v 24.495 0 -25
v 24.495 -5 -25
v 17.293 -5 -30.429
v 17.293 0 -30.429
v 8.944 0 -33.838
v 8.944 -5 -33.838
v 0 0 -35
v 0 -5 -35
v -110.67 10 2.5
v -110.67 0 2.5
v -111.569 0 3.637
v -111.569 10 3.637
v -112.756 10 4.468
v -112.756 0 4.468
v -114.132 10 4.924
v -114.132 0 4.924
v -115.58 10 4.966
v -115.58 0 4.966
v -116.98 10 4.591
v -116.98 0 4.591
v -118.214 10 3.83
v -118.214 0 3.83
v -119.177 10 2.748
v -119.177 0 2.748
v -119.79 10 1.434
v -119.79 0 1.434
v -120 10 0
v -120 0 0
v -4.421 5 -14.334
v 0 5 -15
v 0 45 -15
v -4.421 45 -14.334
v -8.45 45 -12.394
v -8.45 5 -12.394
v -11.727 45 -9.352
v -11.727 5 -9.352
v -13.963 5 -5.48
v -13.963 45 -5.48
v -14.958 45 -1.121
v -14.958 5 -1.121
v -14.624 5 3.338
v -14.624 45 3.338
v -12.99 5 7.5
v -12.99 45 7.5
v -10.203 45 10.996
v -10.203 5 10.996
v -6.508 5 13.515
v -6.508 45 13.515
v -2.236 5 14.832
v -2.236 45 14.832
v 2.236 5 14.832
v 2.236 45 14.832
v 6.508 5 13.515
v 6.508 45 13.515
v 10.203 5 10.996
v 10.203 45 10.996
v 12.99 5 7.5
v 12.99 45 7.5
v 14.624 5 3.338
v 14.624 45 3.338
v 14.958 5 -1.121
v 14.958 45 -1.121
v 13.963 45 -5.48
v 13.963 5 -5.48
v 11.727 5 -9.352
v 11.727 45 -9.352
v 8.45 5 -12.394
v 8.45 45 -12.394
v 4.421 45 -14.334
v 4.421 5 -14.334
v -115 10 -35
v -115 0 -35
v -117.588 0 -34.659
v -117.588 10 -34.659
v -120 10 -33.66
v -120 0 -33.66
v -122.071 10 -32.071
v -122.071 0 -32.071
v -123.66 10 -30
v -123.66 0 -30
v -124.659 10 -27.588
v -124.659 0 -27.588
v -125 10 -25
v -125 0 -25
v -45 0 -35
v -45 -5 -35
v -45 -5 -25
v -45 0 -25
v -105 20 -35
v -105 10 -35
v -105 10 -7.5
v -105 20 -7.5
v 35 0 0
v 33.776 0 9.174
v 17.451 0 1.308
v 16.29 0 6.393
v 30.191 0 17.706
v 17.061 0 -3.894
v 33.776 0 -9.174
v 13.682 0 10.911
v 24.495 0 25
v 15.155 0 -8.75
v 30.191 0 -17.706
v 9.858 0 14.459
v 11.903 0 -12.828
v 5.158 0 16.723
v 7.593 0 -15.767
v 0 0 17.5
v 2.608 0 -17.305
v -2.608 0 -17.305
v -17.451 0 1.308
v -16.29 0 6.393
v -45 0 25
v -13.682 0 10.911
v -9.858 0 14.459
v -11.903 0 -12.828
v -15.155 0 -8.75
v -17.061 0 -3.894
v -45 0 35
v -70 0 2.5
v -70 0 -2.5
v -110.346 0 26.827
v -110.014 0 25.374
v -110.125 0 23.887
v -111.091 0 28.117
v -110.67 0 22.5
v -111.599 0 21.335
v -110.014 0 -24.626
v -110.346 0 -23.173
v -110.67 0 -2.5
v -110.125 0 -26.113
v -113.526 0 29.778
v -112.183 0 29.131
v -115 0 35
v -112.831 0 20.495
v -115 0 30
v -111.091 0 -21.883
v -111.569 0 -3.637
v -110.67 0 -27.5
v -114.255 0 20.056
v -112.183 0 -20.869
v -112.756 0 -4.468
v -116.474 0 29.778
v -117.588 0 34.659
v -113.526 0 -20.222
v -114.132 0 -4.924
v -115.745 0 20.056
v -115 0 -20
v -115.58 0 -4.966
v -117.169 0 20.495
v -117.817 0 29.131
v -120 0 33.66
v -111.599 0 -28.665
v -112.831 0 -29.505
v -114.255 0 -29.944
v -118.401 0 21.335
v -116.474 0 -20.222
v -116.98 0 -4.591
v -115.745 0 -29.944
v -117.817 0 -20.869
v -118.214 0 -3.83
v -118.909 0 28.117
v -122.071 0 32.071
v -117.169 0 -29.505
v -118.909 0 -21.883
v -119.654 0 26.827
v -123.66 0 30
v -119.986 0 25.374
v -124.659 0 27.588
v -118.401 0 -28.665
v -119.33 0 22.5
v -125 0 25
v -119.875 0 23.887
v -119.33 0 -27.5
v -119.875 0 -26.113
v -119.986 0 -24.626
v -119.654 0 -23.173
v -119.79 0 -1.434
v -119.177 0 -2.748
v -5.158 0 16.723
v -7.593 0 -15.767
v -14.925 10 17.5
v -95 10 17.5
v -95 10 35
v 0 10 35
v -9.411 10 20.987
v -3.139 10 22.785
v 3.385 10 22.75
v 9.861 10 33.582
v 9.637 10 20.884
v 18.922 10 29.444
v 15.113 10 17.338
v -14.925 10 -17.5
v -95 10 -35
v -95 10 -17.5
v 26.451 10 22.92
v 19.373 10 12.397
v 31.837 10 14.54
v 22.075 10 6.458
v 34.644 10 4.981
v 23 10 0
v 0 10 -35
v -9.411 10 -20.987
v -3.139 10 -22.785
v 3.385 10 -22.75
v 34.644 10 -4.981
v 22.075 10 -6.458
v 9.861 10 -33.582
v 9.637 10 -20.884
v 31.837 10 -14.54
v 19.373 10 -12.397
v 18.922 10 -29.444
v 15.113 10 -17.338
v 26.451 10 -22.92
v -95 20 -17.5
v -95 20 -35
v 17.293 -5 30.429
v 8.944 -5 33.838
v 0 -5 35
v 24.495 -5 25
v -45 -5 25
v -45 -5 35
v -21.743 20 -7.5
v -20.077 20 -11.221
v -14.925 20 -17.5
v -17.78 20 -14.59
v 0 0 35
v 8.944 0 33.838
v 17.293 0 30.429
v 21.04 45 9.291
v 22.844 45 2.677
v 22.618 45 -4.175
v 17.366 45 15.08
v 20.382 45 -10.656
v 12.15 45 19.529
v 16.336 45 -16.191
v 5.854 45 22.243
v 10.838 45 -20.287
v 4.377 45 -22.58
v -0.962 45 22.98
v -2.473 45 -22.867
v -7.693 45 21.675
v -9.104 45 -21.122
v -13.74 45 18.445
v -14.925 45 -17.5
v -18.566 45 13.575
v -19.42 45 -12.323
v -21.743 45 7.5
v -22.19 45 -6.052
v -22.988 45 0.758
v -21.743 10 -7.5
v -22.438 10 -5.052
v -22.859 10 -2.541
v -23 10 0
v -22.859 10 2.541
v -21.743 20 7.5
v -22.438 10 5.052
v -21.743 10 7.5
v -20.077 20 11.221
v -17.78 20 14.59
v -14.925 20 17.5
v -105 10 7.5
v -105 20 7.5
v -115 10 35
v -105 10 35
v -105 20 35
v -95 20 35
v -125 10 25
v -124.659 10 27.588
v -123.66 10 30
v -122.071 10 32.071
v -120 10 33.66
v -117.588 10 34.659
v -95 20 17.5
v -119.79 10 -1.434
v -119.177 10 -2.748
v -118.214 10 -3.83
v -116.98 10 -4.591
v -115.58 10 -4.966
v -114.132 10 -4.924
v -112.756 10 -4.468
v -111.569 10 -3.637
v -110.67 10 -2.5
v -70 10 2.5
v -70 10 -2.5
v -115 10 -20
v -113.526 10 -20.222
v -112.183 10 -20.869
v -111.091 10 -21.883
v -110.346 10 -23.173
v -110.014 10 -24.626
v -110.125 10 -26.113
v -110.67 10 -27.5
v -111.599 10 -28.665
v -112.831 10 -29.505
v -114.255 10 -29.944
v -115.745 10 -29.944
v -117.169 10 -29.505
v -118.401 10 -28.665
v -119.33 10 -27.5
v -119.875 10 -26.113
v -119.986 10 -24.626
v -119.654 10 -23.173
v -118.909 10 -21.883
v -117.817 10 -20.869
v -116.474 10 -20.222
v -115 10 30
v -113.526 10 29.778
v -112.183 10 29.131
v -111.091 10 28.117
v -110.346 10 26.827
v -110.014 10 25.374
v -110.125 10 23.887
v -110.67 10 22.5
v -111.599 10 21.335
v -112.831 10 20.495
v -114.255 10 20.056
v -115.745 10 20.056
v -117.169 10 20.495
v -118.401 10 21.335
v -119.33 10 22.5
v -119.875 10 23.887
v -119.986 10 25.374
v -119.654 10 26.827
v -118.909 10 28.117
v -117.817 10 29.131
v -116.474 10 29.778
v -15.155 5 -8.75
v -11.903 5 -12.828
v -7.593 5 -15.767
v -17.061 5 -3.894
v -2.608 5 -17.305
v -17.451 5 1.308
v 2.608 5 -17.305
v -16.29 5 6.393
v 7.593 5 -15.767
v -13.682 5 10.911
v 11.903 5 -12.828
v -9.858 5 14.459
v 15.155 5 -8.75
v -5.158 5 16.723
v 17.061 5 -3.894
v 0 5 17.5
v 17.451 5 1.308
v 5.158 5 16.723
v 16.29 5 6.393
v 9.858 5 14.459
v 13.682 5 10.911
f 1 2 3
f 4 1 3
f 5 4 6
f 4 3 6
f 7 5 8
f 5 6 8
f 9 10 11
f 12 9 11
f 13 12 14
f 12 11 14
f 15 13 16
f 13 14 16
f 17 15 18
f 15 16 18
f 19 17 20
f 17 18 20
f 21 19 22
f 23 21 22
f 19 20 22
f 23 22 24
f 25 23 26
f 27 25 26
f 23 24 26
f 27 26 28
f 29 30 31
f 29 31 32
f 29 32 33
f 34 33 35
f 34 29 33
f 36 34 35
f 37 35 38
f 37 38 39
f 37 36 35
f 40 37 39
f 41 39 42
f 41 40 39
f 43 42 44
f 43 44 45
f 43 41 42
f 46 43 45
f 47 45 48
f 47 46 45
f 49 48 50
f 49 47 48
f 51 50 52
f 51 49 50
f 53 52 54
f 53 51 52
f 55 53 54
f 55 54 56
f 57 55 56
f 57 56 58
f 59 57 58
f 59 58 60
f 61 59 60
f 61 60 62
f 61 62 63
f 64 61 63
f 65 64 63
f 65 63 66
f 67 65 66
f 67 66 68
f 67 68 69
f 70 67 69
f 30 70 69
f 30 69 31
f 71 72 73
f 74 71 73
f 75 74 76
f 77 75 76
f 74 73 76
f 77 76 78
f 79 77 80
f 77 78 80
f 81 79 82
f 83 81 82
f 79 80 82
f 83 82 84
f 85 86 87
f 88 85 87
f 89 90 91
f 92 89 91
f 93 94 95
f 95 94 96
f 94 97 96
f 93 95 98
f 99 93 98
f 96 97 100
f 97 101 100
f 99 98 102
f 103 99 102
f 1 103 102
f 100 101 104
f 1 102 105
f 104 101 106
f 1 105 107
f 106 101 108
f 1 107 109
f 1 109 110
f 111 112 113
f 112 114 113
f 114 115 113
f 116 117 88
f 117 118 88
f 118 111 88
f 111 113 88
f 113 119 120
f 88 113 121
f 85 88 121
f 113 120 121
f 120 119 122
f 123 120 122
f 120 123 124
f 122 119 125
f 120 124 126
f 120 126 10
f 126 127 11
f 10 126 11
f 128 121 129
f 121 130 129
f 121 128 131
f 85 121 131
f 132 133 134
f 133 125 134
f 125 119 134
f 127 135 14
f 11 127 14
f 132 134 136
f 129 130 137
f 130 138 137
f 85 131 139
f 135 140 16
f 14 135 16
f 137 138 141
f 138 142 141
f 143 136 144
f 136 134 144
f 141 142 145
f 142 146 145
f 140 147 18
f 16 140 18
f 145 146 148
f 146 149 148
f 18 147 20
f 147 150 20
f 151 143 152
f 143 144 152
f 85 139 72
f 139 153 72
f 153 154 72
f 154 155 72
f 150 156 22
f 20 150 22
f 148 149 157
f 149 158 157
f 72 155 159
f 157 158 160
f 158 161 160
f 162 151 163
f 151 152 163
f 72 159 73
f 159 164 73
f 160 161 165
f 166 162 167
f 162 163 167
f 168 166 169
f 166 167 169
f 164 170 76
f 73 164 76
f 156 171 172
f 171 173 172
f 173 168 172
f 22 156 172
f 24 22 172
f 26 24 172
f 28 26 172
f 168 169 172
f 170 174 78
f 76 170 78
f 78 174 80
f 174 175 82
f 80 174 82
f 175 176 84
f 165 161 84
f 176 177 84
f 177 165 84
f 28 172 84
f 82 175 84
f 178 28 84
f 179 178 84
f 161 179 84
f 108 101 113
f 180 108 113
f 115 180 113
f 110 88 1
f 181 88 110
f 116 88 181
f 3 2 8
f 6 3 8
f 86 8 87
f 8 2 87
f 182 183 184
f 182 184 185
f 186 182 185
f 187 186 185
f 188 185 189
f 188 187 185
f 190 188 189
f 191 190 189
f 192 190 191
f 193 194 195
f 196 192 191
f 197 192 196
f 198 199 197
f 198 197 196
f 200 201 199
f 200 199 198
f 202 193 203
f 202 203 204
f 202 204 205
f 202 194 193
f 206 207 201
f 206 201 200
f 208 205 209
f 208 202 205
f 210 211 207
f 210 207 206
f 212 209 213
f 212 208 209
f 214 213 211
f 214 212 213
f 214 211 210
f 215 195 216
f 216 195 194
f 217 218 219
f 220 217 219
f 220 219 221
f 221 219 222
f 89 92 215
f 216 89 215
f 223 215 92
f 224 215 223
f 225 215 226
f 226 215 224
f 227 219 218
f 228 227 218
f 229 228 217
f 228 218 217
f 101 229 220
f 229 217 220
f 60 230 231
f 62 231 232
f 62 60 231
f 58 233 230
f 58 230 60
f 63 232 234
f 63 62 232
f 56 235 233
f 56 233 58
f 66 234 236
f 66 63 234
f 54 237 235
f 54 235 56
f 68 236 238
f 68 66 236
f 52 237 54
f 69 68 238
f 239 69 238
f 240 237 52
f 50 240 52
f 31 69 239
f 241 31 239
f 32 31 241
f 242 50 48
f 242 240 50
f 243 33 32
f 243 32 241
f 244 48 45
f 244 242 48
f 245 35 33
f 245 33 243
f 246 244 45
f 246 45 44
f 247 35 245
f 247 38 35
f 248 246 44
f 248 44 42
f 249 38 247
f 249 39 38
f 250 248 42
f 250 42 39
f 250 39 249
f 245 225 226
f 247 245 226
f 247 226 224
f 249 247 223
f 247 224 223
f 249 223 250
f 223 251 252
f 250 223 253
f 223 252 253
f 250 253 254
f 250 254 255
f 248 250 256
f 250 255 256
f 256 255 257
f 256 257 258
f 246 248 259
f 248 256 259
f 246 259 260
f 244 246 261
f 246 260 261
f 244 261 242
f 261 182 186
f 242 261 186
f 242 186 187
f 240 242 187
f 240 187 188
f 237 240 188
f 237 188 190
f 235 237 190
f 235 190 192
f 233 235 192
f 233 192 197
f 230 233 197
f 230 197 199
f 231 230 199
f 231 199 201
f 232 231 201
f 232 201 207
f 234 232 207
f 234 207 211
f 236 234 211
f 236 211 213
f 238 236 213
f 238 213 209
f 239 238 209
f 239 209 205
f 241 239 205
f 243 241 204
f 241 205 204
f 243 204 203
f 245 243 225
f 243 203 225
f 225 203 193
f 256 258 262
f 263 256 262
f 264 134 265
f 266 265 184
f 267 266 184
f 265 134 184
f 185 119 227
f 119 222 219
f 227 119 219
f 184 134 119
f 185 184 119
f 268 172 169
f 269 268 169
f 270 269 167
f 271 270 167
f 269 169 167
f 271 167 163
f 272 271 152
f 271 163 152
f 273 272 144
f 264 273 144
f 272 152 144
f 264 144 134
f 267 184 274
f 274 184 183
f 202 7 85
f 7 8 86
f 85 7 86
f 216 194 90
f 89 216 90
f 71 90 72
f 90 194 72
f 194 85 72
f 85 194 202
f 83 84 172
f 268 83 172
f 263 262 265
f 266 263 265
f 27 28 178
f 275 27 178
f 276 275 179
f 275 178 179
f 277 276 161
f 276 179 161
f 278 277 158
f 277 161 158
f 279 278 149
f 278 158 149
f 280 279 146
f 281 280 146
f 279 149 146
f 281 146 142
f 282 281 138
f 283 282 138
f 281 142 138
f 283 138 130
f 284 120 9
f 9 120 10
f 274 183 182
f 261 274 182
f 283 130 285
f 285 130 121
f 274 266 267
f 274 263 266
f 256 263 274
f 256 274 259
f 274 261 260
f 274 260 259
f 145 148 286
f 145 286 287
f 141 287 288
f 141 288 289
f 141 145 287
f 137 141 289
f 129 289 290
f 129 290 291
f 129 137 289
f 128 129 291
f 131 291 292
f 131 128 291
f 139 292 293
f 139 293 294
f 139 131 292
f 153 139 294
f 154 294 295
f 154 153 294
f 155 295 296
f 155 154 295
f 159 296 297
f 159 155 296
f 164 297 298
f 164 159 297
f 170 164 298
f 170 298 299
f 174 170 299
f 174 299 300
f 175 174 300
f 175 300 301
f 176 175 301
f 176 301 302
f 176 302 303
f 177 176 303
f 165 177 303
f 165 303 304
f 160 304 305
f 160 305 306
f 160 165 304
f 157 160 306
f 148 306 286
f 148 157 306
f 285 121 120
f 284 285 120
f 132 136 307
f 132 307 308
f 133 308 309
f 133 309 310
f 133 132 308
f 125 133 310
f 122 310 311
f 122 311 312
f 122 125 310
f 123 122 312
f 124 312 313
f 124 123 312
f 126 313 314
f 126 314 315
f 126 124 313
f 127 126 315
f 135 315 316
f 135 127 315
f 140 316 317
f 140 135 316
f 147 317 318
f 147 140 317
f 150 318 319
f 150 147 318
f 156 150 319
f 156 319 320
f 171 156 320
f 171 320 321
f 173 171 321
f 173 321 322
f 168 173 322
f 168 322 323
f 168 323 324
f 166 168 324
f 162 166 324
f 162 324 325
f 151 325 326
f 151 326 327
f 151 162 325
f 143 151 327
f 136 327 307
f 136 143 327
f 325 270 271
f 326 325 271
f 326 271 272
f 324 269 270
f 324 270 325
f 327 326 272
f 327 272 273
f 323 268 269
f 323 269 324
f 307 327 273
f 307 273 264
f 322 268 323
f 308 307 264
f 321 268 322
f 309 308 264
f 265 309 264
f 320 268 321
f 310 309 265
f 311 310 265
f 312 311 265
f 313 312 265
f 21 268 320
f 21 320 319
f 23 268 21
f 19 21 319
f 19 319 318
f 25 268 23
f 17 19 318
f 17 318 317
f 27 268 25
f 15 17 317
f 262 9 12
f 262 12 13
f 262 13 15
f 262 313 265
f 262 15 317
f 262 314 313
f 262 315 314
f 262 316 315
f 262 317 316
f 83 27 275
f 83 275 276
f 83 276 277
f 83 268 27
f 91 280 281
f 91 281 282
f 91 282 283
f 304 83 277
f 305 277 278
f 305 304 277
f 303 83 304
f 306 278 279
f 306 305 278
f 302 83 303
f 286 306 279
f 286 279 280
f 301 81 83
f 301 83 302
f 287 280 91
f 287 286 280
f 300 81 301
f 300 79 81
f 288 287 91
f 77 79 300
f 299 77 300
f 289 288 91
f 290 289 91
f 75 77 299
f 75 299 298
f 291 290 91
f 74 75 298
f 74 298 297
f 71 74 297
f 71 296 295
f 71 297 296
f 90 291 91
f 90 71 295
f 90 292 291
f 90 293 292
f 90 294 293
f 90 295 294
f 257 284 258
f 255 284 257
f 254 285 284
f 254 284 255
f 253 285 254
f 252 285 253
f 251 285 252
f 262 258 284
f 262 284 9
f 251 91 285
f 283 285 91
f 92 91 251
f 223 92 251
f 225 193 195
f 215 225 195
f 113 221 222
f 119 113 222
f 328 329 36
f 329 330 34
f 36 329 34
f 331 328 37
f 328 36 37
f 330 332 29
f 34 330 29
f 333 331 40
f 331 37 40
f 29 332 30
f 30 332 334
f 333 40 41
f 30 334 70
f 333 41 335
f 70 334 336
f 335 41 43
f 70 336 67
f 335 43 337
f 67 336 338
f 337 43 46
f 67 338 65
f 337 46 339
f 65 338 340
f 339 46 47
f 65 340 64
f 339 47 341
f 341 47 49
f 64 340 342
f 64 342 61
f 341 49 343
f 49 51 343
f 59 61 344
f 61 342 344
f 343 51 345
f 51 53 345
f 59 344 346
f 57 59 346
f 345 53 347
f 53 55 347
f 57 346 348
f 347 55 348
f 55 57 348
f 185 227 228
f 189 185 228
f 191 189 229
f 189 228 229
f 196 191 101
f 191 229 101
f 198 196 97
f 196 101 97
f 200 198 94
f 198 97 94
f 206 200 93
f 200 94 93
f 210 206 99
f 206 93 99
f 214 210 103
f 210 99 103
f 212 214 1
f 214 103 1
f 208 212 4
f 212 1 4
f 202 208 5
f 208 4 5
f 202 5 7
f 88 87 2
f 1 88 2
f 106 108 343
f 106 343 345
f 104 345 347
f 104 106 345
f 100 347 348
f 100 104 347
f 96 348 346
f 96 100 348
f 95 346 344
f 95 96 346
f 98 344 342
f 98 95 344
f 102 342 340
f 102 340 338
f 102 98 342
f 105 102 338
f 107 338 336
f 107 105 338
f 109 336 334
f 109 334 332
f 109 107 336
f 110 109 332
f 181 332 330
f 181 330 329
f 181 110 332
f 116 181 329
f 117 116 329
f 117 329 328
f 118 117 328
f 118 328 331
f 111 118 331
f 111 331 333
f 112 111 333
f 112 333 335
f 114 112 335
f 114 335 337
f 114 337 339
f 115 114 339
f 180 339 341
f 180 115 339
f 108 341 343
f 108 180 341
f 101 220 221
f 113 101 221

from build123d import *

# Parameters (mm, degrees)
EXTRUDE_1_DEPTH     = 10
SKETCH_1_R          = 5
EXTRUDE_1_2_DEPTH   = 10
EXTRUDE_2_DEPTH     = 20
SKETCH_1_4_R        = 23
SKETCH_1_4_R_2      = 15
EXTRUDE_3_DEPTH     = 45
SKETCH_1_5_R        = 17.5
SKETCH_1_5_R_2      = 15
CUT_EXTRUDE_1_DEPTH = 5
EXTRUDE_START       = 5
EXTRUDE_4_DEPTH     = 5


with BuildPart() as part:
    # 草图1 → 凸台-拉伸1 (new body)
    with BuildSketch(Plane(origin=(0, 0, 0), x_dir=(1, 0, 0), z_dir=(0, 1, 0))):
        with BuildLine():
            ThreePointArc((0, -35), (35, 0), (0, 35))
            Line((0, 35), (-95, 35))
            Line((-95, 35), (-95, 17.5))
            Line((-95, 17.5), (-14.924811557, 17.5))
            ThreePointArc((-14.924811557, 17.5), (23, 0), (-14.924811557, -17.5))
            Line((-14.924811557, -17.5), (-95, -17.5))
            Line((-95, -17.5), (-95, -35))
            Line((-95, -35), (0, -35))
        make_face()
    extrude(amount=EXTRUDE_1_DEPTH)



with BuildPart() as body_2:
    # 草图1 → Extrude 1 2 (new body)
    with BuildSketch(Plane(origin=(0, 0, 0), x_dir=(1, 0, 0), z_dir=(0, 1, 0))):
        with BuildLine():
            Line((-105, 7.5), (-105, 35))
            Line((-105, 35), (-115, 35))
            ThreePointArc((-115, 35), (-122.071067812, 32.071067812), (-125, 25))
            Line((-125, 25), (-125, -25))
            ThreePointArc((-125, -25), (-122.071067812, -32.071067812), (-115, -35))
            Line((-115, -35), (-105, -35))
            Line((-105, -35), (-105, -7.5))
            Line((-105, -7.5), (-21.742814905, -7.5))
            ThreePointArc((-21.742814905, -7.5), (-23, 0), (-21.742814905, 7.5))
            Line((-21.742814905, 7.5), (-105, 7.5))
        make_face()
        with BuildLine():
            Line((-70, 2.5), (-70, -2.5))
            Line((-70, -2.5), (-110.669872981, -2.5))
            ThreePointArc((-110.669872981, -2.5), (-120, 0), (-110.669872981, 2.5))
            Line((-110.669872981, 2.5), (-70, 2.5))
        make_face(mode=Mode.SUBTRACT)
        with Locations((-115, 25)):
            Circle(SKETCH_1_R, mode=Mode.SUBTRACT)
        with Locations((-115, -25)):
            Circle(SKETCH_1_R, mode=Mode.SUBTRACT)
    extrude(amount=EXTRUDE_1_2_DEPTH)


with BuildPart() as part_1:
    add(part.part)

    add(body_2.part)  # 凸台-拉伸2 merges body 2
    # 草图1<3> → 凸台-拉伸2 (add)
    with BuildSketch(Plane(origin=(0, 0, 0), x_dir=(1, 0, 0), z_dir=(0, 1, 0))):
        with BuildLine():
            Line((-95, 17.5), (-95, 35))
            Line((-95, 35), (-105, 35))
            Line((-105, 35), (-105, 7.5))
            Line((-105, 7.5), (-21.742814905, 7.5))
            ThreePointArc((-21.742814905, 7.5), (-19.00338674, 12.956515443), (-14.924811557, 17.5))
            Line((-14.924811557, 17.5), (-95, 17.5))
        make_face()
        with BuildLine():
            Line((-105, -35), (-95, -35))
            Line((-95, -35), (-95, -17.5))
            Line((-95, -17.5), (-14.924811557, -17.5))
            ThreePointArc((-14.924811557, -17.5), (-19.00338674, -12.956515443), (-21.742814905, -7.5))
            Line((-21.742814905, -7.5), (-105, -7.5))
            Line((-105, -7.5), (-105, -35))
        make_face()
    extrude(amount=EXTRUDE_2_DEPTH)

    # 草图1<4> → 凸台-拉伸3 (add)
    with BuildSketch(Plane(origin=(0, 0, 0), x_dir=(1, 0, 0), z_dir=(0, 1, 0))):
        Circle(SKETCH_1_4_R)
        Circle(SKETCH_1_4_R_2, mode=Mode.SUBTRACT)
    extrude(amount=EXTRUDE_3_DEPTH)

    # 草图1<5> → 切除-拉伸1 (cut)
    with BuildSketch(Plane(origin=(0, 0, 0), x_dir=(1, 0, 0), z_dir=(0, 1, 0))):
        Circle(SKETCH_1_5_R)
        Circle(SKETCH_1_5_R_2, mode=Mode.SUBTRACT)
    extrude(amount=CUT_EXTRUDE_1_DEPTH, mode=Mode.SUBTRACT)

    # 草图2 → 凸台-拉伸4 (add)
    with BuildSketch(Plane.XZ.offset(EXTRUDE_START)):
        with BuildLine():
            Line((-45, 35), (0, 35))
            ThreePointArc((0, 35), (13.228756555, 32.403703492), (24.494897428, 25))
            Line((24.494897428, 25), (-45, 25))
            Line((-45, 25), (-45, 35))
        make_face()
        with BuildLine():
            Line((-45, -25), (24.494897428, -25))
            ThreePointArc((24.494897428, -25), (13.228756555, -32.403703492), (0, -35))
            Line((0, -35), (-45, -35))
            Line((-45, -35), (-45, -25))
        make_face()
    extrude(amount=-EXTRUDE_4_DEPTH)


solid = part_1.part
